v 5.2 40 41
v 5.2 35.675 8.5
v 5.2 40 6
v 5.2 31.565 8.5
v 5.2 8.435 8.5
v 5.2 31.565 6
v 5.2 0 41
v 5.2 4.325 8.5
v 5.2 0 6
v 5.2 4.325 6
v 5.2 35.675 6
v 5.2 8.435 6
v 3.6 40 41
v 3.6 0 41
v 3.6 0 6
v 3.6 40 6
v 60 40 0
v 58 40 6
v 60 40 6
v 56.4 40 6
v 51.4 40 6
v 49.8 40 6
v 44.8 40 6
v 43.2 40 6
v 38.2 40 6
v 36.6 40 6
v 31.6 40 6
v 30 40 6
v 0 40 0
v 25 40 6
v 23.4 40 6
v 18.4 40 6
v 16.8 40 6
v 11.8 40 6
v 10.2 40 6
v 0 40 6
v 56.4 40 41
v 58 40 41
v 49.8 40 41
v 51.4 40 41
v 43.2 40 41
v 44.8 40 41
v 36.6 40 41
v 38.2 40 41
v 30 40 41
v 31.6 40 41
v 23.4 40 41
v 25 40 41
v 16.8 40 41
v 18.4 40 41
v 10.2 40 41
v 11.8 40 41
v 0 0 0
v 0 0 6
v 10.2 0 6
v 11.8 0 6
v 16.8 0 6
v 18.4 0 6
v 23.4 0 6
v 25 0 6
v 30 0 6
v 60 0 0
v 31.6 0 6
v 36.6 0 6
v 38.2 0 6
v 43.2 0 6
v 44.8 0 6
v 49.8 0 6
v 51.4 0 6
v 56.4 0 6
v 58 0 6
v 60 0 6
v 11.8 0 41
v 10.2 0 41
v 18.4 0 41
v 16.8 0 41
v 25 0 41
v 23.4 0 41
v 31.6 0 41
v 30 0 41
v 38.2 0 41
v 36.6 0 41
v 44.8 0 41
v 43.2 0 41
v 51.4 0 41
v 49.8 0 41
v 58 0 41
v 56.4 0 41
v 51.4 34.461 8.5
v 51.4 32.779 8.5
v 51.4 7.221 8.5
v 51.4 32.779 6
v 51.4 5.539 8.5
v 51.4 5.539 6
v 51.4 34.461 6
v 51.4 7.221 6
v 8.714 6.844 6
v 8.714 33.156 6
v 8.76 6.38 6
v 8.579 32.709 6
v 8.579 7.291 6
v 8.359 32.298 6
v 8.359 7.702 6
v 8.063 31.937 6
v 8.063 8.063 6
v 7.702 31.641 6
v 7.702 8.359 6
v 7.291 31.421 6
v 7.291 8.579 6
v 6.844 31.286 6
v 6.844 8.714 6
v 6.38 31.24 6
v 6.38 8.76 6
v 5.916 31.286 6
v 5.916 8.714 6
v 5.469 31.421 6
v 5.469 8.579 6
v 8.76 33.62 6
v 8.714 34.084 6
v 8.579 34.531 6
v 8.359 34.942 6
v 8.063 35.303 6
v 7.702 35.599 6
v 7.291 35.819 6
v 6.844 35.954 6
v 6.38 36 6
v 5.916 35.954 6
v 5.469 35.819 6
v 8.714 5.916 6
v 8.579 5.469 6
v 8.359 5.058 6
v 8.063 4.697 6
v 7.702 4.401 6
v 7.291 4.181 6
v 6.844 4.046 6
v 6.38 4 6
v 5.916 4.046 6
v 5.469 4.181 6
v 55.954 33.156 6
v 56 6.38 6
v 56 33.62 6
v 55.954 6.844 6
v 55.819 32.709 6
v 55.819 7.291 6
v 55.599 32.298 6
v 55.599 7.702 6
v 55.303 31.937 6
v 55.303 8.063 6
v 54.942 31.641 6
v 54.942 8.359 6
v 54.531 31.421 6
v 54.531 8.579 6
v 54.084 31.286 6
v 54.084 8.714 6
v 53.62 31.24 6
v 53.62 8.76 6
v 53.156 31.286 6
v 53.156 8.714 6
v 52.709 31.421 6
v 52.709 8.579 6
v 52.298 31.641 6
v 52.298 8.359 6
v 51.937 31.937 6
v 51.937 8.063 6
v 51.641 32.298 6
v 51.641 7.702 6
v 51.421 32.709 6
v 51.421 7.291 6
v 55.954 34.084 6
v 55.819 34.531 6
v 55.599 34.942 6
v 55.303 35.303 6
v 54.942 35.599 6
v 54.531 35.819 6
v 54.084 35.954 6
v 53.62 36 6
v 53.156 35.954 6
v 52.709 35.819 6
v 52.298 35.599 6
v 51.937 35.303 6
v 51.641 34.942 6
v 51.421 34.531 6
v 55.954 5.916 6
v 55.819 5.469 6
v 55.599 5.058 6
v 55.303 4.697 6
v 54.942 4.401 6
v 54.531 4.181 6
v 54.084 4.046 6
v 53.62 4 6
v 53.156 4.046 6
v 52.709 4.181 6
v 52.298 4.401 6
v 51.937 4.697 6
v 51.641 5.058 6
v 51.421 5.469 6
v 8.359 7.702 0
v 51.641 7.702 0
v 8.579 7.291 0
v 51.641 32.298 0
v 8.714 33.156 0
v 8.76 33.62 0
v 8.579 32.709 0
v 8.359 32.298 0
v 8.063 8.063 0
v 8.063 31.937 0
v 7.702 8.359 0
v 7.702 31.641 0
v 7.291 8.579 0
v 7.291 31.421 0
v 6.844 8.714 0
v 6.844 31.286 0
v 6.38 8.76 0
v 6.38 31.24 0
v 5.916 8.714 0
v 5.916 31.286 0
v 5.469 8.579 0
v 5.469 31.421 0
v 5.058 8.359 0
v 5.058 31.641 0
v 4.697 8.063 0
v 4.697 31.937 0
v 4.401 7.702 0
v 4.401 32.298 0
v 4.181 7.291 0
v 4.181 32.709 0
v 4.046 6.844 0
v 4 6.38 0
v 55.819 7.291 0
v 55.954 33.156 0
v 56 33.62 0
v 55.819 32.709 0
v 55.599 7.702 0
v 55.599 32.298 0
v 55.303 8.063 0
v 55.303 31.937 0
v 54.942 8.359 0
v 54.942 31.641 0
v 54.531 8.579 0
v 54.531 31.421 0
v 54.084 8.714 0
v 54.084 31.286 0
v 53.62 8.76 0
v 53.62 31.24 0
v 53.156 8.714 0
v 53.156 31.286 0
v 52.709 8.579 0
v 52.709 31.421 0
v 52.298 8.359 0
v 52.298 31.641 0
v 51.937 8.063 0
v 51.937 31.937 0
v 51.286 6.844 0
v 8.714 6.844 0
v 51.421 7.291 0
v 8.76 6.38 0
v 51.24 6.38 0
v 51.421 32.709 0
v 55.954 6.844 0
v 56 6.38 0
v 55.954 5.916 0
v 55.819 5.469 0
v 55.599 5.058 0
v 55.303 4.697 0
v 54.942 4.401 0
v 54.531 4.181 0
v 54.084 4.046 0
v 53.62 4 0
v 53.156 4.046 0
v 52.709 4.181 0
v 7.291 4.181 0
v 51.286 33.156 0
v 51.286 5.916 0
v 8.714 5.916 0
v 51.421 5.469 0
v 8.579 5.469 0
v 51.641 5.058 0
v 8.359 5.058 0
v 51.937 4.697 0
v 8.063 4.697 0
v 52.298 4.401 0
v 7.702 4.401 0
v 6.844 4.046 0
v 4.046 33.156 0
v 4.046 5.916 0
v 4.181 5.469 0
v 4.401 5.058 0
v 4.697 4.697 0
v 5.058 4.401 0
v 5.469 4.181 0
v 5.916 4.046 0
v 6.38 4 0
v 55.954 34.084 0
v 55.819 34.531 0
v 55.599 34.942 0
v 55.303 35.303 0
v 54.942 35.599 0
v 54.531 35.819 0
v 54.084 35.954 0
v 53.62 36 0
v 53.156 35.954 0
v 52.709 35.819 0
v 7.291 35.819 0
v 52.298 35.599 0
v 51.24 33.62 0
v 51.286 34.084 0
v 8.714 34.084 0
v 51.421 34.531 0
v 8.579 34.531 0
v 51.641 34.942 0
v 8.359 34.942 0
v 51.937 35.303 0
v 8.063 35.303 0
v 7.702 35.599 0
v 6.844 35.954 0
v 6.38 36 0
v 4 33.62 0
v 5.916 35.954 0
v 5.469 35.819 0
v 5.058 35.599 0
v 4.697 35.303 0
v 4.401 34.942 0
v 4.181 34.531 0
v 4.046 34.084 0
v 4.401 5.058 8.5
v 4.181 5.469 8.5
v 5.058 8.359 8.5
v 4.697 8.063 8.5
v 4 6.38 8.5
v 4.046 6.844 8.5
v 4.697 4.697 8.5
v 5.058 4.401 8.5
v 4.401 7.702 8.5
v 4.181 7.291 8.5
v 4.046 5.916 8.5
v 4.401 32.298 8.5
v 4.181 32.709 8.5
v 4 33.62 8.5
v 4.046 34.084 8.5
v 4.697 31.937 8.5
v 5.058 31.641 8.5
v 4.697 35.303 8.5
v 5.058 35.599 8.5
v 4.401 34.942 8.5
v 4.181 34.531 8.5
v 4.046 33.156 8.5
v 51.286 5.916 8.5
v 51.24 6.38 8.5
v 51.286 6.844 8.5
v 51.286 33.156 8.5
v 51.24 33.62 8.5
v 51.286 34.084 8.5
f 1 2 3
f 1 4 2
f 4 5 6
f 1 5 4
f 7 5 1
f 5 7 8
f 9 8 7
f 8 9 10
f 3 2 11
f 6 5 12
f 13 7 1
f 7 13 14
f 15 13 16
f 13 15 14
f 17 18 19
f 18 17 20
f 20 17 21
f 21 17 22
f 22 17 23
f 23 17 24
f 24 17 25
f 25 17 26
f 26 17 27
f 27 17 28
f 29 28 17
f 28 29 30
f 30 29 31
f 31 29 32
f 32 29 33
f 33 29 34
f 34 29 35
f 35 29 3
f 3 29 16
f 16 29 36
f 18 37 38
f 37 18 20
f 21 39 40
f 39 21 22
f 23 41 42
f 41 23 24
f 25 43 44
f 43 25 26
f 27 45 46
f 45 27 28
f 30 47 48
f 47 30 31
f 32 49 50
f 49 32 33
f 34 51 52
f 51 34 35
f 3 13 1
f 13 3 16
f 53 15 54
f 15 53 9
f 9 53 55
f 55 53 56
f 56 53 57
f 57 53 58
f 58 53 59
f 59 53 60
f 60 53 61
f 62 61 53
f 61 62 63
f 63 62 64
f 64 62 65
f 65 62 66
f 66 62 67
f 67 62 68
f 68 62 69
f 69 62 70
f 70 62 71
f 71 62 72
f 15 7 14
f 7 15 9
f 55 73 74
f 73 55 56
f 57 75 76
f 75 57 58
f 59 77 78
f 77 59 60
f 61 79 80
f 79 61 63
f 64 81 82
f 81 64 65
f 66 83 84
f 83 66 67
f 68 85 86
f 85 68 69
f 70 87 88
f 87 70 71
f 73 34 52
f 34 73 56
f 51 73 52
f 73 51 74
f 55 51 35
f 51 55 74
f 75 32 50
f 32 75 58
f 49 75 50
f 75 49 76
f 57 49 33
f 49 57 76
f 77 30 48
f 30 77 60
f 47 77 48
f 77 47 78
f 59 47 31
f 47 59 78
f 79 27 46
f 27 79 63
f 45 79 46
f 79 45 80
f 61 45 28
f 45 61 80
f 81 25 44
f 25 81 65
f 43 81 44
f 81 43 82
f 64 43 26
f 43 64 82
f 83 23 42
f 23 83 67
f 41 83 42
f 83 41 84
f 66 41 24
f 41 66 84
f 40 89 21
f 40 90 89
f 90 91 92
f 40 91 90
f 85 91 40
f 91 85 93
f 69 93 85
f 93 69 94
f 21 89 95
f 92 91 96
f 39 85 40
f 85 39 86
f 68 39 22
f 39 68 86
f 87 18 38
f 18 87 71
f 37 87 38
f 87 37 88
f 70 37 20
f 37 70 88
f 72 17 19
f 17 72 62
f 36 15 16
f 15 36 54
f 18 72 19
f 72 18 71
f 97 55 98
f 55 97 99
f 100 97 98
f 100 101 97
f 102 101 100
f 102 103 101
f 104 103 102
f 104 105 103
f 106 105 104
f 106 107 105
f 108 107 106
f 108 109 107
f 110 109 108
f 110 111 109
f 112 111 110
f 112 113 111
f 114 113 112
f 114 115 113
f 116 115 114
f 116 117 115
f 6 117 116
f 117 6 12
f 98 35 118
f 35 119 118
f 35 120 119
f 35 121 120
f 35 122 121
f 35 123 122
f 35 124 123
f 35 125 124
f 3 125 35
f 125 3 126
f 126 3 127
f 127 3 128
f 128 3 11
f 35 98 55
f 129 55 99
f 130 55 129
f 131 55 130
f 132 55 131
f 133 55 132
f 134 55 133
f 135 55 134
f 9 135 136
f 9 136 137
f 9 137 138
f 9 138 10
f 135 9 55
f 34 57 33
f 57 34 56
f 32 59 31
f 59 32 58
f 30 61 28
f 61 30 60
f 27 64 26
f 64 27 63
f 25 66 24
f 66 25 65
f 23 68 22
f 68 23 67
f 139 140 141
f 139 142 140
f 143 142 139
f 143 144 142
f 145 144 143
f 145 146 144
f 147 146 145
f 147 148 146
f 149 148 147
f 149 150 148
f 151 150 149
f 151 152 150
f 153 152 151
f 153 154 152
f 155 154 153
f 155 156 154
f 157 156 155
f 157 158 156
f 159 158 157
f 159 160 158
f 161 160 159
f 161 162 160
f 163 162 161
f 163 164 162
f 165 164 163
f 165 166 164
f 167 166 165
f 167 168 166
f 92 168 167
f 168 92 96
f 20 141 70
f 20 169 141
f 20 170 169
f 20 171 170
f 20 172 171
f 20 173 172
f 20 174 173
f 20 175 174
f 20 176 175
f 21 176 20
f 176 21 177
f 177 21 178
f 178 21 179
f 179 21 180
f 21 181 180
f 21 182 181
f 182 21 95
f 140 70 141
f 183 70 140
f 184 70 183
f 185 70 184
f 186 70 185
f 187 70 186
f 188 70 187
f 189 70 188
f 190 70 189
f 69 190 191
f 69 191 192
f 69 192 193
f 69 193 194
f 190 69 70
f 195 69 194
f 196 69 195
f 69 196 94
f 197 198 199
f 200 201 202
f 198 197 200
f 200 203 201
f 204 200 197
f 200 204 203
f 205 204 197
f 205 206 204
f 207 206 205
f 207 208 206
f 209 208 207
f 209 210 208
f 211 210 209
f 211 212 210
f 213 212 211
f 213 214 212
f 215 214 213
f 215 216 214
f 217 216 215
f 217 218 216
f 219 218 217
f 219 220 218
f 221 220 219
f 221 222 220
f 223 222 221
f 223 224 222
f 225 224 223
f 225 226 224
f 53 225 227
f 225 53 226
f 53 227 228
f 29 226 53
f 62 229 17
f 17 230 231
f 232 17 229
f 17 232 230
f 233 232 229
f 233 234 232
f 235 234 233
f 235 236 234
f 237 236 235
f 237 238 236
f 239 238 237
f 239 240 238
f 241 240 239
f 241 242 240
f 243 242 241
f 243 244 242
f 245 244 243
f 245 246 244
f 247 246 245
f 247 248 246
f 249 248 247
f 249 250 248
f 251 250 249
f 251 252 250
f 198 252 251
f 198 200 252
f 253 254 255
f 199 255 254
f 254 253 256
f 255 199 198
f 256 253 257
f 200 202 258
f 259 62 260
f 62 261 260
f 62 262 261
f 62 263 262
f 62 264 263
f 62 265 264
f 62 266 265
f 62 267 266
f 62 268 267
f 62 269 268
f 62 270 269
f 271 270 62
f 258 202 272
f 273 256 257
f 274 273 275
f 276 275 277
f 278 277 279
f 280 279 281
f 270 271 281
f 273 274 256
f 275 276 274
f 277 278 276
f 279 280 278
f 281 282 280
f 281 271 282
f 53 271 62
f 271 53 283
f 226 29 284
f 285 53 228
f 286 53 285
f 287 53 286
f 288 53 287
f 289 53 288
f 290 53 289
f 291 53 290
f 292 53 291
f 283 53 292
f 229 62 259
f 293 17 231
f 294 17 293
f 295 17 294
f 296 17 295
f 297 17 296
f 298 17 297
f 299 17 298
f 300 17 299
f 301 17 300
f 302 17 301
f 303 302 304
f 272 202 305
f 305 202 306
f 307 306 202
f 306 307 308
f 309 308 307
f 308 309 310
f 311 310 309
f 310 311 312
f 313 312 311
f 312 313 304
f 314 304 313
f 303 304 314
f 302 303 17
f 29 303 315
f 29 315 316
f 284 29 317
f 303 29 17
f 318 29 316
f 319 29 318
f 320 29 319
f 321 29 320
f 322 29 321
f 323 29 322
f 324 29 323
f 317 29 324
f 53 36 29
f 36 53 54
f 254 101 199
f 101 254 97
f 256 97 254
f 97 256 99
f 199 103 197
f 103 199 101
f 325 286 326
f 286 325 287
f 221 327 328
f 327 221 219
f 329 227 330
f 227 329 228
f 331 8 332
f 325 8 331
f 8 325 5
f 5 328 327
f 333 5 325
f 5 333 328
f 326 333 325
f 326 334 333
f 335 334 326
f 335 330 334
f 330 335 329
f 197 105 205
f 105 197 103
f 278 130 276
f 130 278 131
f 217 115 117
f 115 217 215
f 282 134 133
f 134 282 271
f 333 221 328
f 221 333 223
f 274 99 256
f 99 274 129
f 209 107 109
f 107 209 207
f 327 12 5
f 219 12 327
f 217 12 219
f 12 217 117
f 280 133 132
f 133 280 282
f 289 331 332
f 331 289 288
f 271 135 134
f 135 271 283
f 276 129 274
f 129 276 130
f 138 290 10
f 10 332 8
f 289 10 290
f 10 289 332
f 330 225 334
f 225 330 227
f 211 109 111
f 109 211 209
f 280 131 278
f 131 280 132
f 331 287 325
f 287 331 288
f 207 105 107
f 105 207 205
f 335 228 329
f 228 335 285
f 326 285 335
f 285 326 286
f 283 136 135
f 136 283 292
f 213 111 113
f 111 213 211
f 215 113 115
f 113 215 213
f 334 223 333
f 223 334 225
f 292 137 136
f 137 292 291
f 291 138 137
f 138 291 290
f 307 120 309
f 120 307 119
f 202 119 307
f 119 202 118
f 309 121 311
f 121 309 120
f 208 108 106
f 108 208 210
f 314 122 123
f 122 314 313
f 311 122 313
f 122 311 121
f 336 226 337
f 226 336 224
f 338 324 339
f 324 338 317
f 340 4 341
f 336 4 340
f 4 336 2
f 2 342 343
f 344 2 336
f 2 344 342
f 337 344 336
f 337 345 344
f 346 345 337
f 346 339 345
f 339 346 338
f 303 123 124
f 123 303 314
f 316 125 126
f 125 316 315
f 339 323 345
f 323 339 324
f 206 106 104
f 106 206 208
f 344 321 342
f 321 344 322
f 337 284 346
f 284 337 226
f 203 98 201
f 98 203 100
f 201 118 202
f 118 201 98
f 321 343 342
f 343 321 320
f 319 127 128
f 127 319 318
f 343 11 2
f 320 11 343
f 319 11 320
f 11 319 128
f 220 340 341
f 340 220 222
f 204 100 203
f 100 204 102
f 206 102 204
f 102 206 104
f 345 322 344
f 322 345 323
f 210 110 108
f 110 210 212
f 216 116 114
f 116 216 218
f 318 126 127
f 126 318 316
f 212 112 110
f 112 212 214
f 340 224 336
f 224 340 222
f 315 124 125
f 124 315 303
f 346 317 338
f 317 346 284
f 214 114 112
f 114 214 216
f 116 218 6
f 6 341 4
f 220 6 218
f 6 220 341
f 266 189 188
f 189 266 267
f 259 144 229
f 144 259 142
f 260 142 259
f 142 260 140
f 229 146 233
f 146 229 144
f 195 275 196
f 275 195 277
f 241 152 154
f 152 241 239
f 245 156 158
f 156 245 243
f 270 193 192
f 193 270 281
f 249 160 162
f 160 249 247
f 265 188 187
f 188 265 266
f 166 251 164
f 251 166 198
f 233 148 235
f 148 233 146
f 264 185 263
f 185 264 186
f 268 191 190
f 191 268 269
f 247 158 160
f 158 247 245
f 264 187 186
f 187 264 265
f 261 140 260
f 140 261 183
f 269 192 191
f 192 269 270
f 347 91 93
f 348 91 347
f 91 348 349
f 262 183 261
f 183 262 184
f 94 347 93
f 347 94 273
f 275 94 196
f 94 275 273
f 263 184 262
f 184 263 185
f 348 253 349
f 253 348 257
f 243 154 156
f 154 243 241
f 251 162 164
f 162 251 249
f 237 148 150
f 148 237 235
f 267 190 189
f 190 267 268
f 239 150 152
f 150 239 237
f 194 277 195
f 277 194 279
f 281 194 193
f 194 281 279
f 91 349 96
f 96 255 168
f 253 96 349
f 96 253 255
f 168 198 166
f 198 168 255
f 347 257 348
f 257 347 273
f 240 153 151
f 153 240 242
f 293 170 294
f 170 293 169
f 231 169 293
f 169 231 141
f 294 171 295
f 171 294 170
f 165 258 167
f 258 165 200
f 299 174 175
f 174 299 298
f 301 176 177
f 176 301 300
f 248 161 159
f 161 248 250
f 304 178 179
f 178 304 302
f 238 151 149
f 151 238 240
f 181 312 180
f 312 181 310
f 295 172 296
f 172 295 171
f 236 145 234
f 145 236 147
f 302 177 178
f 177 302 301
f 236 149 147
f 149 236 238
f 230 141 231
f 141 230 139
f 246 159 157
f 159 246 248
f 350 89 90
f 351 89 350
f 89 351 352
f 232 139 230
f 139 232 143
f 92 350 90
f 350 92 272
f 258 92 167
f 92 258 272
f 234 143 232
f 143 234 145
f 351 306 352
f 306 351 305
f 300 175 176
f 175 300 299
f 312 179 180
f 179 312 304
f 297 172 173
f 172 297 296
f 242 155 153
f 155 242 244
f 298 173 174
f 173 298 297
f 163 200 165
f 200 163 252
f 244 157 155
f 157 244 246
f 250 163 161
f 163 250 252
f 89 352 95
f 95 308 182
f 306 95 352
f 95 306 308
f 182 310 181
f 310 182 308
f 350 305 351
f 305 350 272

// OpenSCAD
$fn = 32;

// ----------------------------------------------------------------------
// Finned heat sink: 60 x 40 mm base, 35 mm fins
// ----------------------------------------------------------------------

// --- parameters (mm) ---
base_w = 60;              // base width
base_d = 40;              // base depth
base_t = 6;               // base thickness
fin_h = 35;               // fin height above the base
holes_d = 4.76;           // fixing holes
hole_x = 23.62;           // hole offset in x
hole_y = 13.62;           // hole offset in y
fin_t = 1.6;              // fin thickness
fin_pitch = 6.6;          // fin pitch
fin_count = 9;            // number of fins
fin_x0 = 3.6;             // first fin offset

difference() {
  union() {
    cube([base_w, base_d, base_t]);
    for (i = [0 : fin_count - 1]) {
      translate([fin_x0 + i * fin_pitch, 0, base_t - 0.5]) cube([fin_t, base_d, fin_h + 0.5]);
    }
  }
  /* fixing holes through the base, 2.5 mm clear on both sides */
  for (hx = [-23.62, 23.62]) {
    for (hy = [-13.62, 13.62]) {
      translate([base_w / 2 + hx, base_d / 2 + hy, -2.5]) cylinder(h = base_t + 5, d = holes_d);
    }
  }
}
